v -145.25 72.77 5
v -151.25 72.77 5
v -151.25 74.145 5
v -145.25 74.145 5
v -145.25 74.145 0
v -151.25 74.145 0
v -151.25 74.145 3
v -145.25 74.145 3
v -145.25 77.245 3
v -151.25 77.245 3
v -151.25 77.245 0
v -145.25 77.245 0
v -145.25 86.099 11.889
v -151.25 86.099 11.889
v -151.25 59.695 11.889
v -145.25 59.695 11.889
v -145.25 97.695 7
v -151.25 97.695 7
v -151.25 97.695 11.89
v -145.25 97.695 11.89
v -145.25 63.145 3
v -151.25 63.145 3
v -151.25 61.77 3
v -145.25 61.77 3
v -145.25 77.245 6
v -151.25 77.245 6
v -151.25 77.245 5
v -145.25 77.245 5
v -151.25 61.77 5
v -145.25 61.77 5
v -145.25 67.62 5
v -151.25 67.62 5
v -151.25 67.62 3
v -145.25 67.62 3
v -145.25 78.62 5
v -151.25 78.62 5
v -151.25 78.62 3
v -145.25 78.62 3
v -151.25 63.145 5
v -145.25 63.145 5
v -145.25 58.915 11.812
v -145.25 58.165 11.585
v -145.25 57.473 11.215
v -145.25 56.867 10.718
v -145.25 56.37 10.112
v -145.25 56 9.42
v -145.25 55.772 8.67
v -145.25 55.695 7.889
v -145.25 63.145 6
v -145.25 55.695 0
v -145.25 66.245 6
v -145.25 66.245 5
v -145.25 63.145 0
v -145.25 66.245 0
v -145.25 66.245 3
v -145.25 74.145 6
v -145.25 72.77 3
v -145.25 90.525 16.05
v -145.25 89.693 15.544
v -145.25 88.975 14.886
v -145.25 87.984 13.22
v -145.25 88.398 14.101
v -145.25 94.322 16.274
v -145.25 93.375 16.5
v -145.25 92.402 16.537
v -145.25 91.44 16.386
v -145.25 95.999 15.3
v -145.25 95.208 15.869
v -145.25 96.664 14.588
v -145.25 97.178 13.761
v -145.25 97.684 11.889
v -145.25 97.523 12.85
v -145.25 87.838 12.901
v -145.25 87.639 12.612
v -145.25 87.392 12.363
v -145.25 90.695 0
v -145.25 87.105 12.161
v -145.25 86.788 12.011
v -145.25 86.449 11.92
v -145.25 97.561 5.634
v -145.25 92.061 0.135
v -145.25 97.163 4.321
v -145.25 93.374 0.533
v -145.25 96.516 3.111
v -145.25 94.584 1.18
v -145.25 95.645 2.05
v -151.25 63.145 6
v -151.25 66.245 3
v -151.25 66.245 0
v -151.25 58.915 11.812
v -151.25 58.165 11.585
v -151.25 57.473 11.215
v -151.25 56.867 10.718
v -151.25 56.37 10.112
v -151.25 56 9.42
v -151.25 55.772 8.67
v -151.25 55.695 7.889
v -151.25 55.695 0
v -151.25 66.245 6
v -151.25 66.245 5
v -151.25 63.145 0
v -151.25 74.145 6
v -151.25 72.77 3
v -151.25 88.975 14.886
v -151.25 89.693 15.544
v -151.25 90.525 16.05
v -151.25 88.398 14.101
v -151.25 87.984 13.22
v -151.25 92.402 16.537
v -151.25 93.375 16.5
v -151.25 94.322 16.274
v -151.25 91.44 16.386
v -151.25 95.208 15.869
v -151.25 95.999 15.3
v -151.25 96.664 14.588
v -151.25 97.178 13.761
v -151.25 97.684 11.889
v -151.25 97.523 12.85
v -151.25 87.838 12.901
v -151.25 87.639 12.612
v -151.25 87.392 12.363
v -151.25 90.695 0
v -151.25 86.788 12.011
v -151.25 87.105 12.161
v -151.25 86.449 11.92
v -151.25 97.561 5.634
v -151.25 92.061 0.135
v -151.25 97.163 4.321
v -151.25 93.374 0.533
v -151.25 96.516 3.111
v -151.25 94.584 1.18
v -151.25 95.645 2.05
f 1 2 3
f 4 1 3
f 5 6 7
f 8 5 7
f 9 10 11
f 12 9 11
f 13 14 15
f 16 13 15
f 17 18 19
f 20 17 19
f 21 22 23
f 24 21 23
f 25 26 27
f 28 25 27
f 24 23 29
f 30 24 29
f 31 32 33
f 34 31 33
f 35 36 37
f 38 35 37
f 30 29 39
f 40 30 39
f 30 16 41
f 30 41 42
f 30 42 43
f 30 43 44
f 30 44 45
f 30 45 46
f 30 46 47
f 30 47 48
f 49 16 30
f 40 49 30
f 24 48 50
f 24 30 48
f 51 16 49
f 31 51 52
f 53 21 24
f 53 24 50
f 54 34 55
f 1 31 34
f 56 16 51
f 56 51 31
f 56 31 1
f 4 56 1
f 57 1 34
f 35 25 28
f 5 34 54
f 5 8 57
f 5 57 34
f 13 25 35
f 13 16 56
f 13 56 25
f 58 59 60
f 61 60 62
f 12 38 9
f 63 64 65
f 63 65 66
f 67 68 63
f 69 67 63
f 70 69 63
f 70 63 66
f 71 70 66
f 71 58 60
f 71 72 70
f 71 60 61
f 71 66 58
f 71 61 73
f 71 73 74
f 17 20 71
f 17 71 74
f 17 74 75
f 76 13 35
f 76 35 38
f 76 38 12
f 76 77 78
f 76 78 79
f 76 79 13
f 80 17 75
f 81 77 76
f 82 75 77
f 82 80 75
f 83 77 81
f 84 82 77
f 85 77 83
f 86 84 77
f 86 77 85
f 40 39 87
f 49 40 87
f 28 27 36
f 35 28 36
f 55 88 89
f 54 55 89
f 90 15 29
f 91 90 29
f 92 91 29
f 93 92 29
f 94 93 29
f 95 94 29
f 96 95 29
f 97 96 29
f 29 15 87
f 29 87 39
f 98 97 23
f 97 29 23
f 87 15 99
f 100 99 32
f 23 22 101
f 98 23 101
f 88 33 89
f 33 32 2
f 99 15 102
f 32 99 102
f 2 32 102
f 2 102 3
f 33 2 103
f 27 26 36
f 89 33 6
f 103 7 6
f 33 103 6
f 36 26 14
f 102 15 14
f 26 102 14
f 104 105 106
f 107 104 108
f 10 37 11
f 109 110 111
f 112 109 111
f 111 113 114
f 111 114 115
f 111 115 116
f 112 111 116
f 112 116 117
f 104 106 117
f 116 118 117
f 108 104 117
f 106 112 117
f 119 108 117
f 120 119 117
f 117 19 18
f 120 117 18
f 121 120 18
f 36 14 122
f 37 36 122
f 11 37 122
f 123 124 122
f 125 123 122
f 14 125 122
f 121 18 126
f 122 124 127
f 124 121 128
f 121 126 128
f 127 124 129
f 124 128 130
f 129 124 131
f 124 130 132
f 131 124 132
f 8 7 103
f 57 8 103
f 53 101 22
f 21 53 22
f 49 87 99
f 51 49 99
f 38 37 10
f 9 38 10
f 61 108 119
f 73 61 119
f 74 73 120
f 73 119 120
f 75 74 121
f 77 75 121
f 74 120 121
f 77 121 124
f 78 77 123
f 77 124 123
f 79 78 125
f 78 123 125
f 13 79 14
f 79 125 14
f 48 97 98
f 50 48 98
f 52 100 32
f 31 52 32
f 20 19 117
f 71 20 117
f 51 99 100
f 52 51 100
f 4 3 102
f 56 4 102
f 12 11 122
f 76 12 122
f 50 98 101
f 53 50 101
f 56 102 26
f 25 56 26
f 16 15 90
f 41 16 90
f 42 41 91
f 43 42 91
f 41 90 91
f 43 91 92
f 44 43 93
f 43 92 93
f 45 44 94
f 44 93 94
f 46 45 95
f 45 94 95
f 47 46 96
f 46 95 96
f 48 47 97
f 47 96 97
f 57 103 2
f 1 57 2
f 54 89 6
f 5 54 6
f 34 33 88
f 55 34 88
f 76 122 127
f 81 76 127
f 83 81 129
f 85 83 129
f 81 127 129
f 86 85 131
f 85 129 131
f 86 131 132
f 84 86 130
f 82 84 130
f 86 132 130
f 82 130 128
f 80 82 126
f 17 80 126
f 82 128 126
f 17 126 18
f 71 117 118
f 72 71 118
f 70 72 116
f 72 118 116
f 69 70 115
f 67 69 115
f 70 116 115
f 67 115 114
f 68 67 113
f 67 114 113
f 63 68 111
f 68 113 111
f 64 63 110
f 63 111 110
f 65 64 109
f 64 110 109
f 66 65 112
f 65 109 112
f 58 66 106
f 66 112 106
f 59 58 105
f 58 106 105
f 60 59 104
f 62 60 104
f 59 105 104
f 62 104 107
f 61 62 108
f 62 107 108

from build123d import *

# Parameters (mm, degrees)
DODANIE_WYCI_GNI_CIE5_DEPTH = 6
WYTNIJ_WYCI_GNI_CIE1_DEPTH  = 20
SZYK_LINIOWY1_COUNT         = 2
SZYK_LINIOWY1_PITCH         = 11


with BuildPart() as part:
    # Szkic8 → Dodanie-wyciągnięcie5 (new body)
    with BuildSketch(Plane(origin=(-151.25, 2.463759923, 0), x_dir=(0, 0, -1), z_dir=(1, 0, 0))):
        with BuildLine():
            Line((0, 53.231732465), (0, 88.231732465))
            ThreePointArc((0, 88.231732465), (-2.050252532, 93.181479934), (-7, 95.231732465))
            Line((-7, 95.231732465), (-11.890119353, 95.231732465))
            Line((-11.890119353, 95.231732465), (-11.889307623, 95.219936285))
            ThreePointArc((-11.889307623, 95.219936285), (-16.499670074, 90.911212793), (-13.219806753, 85.520198357))
            ThreePointArc((-13.219806753, 85.520198357), (-12.255446898, 84.789057353), (-11.889307623, 83.635584713))
            Line((-11.889307623, 83.635584713), (-11.889307623, 57.231732465))
            ThreePointArc((-11.889307623, 57.231732465), (-10.717734748, 54.403305341), (-7.889307623, 53.231732465))
            Line((-7.889307623, 53.231732465), (0, 53.231732465))
        make_face()
    extrude(amount=DODANIE_WYCI_GNI_CIE5_DEPTH)

    # Szkic2 → Wytnij-wyciągnięcie1 (cut)
    with BuildSketch(Plane(origin=(-151.25, 155.607400163, 0), x_dir=(0, 0, -1), z_dir=(-1, 0, 0))):
        Polygon((-6, 81.461907774), (-6, 78.361907774), (-5, 78.361907774), (-5, 76.986907774), (-3, 76.986907774), (-3, 78.361907774), (0, 78.361907774), (0, 81.461907774), (-3, 81.461907774), (-3, 82.836907774), (-5, 82.836907774), (-5, 81.461907774), align=None)
    wytnij_wyci_gni_cie1 = extrude(amount=-WYTNIJ_WYCI_GNI_CIE1_DEPTH, mode=Mode.SUBTRACT)

    # Szyk liniowy1: Wytnij-wyciągnięcie1 ×2
    with Locations(*[(0, -i * SZYK_LINIOWY1_PITCH, 0) for i in range(1, SZYK_LINIOWY1_COUNT)]):
        add(wytnij_wyci_gni_cie1, mode=Mode.SUBTRACT)


solid = part.part
